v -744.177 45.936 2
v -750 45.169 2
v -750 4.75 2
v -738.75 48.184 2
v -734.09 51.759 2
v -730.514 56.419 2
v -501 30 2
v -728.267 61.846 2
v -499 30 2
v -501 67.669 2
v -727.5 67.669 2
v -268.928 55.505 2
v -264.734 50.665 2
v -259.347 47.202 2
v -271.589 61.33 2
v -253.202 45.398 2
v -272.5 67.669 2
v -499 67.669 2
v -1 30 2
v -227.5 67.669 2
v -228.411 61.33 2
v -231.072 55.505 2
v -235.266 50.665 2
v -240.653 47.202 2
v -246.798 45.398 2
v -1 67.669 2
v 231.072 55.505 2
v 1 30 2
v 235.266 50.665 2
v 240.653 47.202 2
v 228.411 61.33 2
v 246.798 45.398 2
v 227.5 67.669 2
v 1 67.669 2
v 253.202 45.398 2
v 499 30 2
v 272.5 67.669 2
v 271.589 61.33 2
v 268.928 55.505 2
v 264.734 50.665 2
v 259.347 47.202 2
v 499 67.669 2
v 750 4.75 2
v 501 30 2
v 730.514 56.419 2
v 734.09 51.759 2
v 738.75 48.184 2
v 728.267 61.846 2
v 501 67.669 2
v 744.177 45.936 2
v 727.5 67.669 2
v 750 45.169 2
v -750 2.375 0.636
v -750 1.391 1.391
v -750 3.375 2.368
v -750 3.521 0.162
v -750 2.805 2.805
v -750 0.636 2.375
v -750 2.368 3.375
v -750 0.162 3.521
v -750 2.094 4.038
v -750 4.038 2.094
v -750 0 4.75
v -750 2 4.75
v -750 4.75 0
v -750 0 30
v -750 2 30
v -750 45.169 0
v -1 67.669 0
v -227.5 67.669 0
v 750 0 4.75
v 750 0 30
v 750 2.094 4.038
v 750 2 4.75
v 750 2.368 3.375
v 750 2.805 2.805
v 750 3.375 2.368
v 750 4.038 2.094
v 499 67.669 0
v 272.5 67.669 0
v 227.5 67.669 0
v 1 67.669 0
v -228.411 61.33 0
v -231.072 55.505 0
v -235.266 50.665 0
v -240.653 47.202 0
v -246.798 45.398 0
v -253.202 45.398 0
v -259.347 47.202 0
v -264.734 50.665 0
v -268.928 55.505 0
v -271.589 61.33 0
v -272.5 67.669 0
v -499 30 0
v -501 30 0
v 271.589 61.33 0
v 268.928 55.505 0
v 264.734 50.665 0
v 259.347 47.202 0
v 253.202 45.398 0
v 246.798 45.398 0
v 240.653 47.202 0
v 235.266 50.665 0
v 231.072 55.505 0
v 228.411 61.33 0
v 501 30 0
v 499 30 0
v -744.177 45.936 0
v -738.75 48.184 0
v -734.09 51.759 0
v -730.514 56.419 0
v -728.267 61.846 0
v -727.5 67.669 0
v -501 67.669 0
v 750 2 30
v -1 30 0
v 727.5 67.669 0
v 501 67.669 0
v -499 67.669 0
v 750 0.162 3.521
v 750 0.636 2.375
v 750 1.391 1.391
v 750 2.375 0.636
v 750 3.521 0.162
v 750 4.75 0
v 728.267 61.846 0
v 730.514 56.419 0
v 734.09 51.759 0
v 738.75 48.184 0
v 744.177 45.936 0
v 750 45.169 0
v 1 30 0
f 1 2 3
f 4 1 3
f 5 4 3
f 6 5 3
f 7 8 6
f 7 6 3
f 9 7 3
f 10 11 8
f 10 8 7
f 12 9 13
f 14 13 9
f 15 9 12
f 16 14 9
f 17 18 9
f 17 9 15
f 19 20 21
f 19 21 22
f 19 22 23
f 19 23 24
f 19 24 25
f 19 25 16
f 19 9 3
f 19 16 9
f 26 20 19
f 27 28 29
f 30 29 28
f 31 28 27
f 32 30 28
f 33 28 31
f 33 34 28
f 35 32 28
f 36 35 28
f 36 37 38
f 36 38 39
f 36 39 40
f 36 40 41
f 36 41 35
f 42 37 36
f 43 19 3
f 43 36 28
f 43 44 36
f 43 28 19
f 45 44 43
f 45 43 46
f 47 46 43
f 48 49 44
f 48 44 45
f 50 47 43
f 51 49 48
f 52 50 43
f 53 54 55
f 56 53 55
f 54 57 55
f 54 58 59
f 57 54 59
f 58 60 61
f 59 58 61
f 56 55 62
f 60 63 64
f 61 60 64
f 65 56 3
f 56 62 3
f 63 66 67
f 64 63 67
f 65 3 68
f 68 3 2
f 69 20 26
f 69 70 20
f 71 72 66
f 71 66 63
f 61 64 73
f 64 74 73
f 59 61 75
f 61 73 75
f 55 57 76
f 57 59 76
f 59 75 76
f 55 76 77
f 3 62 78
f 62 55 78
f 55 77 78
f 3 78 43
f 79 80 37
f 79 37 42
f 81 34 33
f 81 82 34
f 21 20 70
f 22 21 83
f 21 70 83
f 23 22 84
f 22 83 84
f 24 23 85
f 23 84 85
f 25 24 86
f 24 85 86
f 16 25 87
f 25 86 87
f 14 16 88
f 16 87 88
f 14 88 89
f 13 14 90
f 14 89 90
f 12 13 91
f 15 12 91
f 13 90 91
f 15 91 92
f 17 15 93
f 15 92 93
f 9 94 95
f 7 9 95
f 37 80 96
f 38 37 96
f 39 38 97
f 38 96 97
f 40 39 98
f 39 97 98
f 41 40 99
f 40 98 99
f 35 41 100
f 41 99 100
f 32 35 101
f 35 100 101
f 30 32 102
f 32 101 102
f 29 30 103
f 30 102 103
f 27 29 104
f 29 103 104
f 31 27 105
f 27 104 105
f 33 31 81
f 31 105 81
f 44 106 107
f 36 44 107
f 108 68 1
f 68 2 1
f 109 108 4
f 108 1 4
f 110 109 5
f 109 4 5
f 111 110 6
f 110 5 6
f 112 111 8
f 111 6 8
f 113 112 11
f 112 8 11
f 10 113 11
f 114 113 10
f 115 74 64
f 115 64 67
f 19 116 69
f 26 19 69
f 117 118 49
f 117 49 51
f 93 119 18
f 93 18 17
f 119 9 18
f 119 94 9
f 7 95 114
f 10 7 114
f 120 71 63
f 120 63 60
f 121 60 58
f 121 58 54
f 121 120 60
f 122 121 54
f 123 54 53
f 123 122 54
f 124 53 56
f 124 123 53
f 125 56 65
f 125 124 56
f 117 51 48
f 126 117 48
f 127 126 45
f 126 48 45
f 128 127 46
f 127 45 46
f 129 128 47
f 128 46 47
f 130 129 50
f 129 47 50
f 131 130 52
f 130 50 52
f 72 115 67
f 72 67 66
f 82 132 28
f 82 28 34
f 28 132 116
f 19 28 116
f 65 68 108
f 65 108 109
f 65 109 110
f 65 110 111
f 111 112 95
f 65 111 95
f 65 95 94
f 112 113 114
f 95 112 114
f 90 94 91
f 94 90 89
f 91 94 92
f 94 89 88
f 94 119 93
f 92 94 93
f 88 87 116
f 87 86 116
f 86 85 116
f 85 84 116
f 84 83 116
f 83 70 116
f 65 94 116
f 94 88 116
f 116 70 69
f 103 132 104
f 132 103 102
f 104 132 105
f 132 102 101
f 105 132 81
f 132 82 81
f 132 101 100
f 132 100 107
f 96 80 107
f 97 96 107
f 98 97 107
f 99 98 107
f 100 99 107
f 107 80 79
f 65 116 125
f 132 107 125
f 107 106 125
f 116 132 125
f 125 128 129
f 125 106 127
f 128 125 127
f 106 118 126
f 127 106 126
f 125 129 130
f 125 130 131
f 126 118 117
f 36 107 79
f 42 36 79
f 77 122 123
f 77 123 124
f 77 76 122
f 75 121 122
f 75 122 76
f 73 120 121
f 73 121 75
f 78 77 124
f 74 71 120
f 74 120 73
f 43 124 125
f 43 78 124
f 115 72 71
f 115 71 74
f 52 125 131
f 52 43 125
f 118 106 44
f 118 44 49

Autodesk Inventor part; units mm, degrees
ref_plane "YZ Plane" through (0, 0, 0) normal (1, 0, 0) x (0, 1, 0)
ref_plane "XZ Plane" through (0, 0, 0) normal (0, 1, 0) x (-1, 0, 0)
ref_plane "XY Plane" through (0, 0, 0) normal (0, 0, 1) x (1, 0, 0)
sketch "Sketch1" plane through (0, 0, 0) normal (0, 0, 1) x (1, 0, 0)
  line L0 (-750, 67.6691) -> (750, 67.6691)
  line L1 (750, 67.6691) -> (750, 0)
  line L2 (750, 0) -> (-750, 0)
  line L3 (-750, 0) -> (-750, 67.6691)
  point P0 (0, 0)
  point P1 (0, 0)
  dimension "d0" = 1500
  dimension "d1" = 67.669
extrude "Plate1" add sketch "Sketch1" along normal blind 2
sketch "Sketch2" plane through (750, 2, 0) normal (0, -1, 0) x (1, 0, 0)
  line L0 (-1500, 0) -> (0, 0)
  line L1 (0, 0) -> (0, 30)
  line L2 (0, 30) -> (-1500, 30)
  line L3 (-1500, 30) -> (-1500, 0)
edge flange "Flange1" height 30 angle 90 thickness 2 bend radius 2.75 thickness toward (0, -1, 0) relief round relief width 2 relief depth 1 edges at (0, 0, 2) wall of the first edge with corners at (-750, 2, 0) (750, 2, 0) (750, 2, 30) (-750, 2, 30)
bend "Bend1"
corner "Corner1"
sketch "Sketch5" plane through (0, 0, 0) normal (0, 0, -1) x (-1, 0, 0)
  line L0 (750, 67.6691) -> (-750, 67.6691) projected
  line L1 (-1, 30) -> (-1, 67.6691)
  line L2 (750, 0) -> (-750, 0) projected
  line L3 (-1, 30) -> (1, 30)
  line L4 (1, 30) -> (1, 67.6691)
  point P0 (0, 0)
  point P1 (0, 30)
  point P2 (0, 0)
  dimension "d27" = 2
  dimension "d29" = 30
extrude "Extrusion1" cut sketch "Sketch5" against normal through all
pattern_linear "Rectangular Pattern1" count 3 spacing 500 along (1, 0, 0) of "Extrusion1" first direction both ways yes
sketch "Sketch6" plane through (0, 0, 0) normal (0, 0, -1) x (-1, 0, 0)
  line L0 (-750, 67.6691) -> (-750, 4.75) projected
  circle A0 centre (-750, 67.6691) radius 22.5
  line L1 (-750, 67.6691) -> (750, 67.6691) projected
  line L2 (-1, 67.6691) -> (-1, 30) projected
  line L3 (-499, 30) -> (-499, 67.6691) projected
  line L4 (-1, 30) -> (-499, 30) construction
  circle A1 centre (-250, 67.6691) radius 22.5
  point P0 (0, 0)
  point P1 (-727.5, 67.6691)
  point P2 (-750, 45.1691)
  point P3 (-250, 30)
  dimension "d24" = 45
extrude "Extrusion2" cut sketch "Sketch6" along normal mid plane 30 contours L1 A0 L0 | A1 L1 | L1 A1 picked at (-748.3311, 52.8571)
mirror "Mirror1" about plane through (0, 0, 0) normal (1, 0, 0) of "Extrusion2"
sketch "Sketch7" plane through (0, 0, 2) normal (0, 0, 1) x (1, 0, 0)
  arc A0 (-750, 45.1691) -> (-727.5, 67.6691) centre (-750, 67.6691) ccw projected
  line L0 (-750, 4.75) -> (-750, 45.1691) projected
  line L1 (-750, 4.75) -> (750, 4.75) projected
  line L2 (750, 45.1691) -> (750, 4.75) projected
  arc A1 (727.5, 67.6691) -> (750, 45.1691) centre (750, 67.6691) ccw projected
  line L3 (501, 67.6691) -> (727.5, 67.6691) projected
  line L4 (501, 67.6691) -> (501, 30) projected
  line L5 (501, 30) -> (499, 30) projected
  line L6 (499, 30) -> (499, 67.6691) projected
  line L7 (1, 67.6691) -> (227.5, 67.6691) projected
  line L8 (1, 67.6691) -> (1, 30) projected
  line L9 (1, 30) -> (-1, 30) projected
  line L10 (-1, 30) -> (-1, 67.6691) projected
  line L11 (-499, 67.6691) -> (-272.5, 67.6691) projected
  line L12 (-499, 67.6691) -> (-499, 30) projected
  line L13 (-499, 30) -> (-501, 30) projected
  line L14 (-501, 30) -> (-501, 67.6691) projected
  line L15 (-727.5, 67.6691) -> (-501, 67.6691) projected
  line L16 (649, 32.2095) -> (651, 32.2095)
  line L17 (651, 32.2095) -> (651, 40.2095)
  line L18 (651, 40.2095) -> (649, 40.2095)
  line L19 (649, 40.2095) -> (649, 32.2095)
  line L20 (-750, 4.75) -> (750, 4.75) projected
  line L21 (650, 4.75) -> (650, 67.6691) construction
  line L22 (637, 32.2095) -> (639, 32.2095)
  line L23 (639, 32.2095) -> (639, 40.2095)
  line L24 (639, 40.2095) -> (637, 40.2095)
  line L25 (637, 40.2095) -> (637, 32.2095)
  line L26 (272.5, 67.6691) -> (499, 67.6691) projected
  arc A2 (227.5, 67.6691) -> (272.5, 67.6691) centre (250, 67.6691) ccw projected
  line L27 (-227.5, 67.6691) -> (-1, 67.6691) projected
  arc A3 (-272.5, 67.6691) -> (-227.5, 67.6691) centre (-250, 67.6691) ccw projected
  point P0 (0, 0)
  point P1 (650, 32.2095)
  point P2 (649, 36.2095)
  point P3 (650, 36.2095)
  point P4 (639, 36.2095)
  dimension "d30" = 2
  dimension "d31" = 8
  dimension "d32" = 100
  dimension "d33" = 2
  dimension "d34" = 8
  dimension "d35" = 10
extrude "Extrusion3" [suppressed]
mirror "Mirror2" [suppressed]
sketch "Sketch9" plane through (0, 0, 2) normal (0, 0, 1) x (1, 0, 0)
  line L0 (494, 62.6691) -> (494, 50.6691) construction
  line L1 (494, 50.6691) -> (294, 50.6691) construction
  line L2 (294, 50.6691) -> (294, 62.6691) construction
  line L3 (294, 62.6691) -> (494, 62.6691) construction
  line L4 (499, 30) -> (499, 67.6691) projected
  line L5 (1, 67.6691) -> (499, 67.6691) projected
  point P0 (0, 0)
  dimension "d40" = 200
  dimension "d41" = 12
  dimension "d42" = 5
  dimension "d43" = 5
mark "Mark2"
equation "\"d1\" = Стрингер_2"
equation "\"d27\" = d18"
equation "\"d29\" = Стрингер_глубина_паза"
equation "\"d43\" = d42"
equation "\"d2\" = Thickness"
equation "\"d3\" = BendReliefWidth"
equation "\"d4\" = BendReliefDepth"
equation "\"d5\" = MinimumRemnant"
equation "\"d6\" = TransitionRadius"
equation "\"d9\" = BendRadius"
equation "\"d10\" = CornerReliefSize"
equation "\"d11\" = GapSize"
equation "\"d12\" = JacobiRadiusSize"
equation "\"BendReliefWidth\" = Thickness"
equation "\"BendReliefDepth\" = 0.5 * Thickness"
equation "\"CornerReliefSize\" = 4 * Thickness"
equation "\"MinimumRemnant\" = 2 * Thickness"
equation "\"TransitionRadius\" = BendRadius"
equation "\"JacobiRadiusSize\" = BendRadius"
equation "\"GapSize\" = Thickness"
equation "\"d18\" = Thickness"
equation "\"qqqqqq\" = 67.35706"
equation "\"Стрингер_2\" = 67.669053"
equation "\"Стрингер_глубина_паза\" = 30"
equation "\"Thickness\" = 2"
equation "\"BendRadius\" = 2.75"
properties part number "МОО 062 stringer спина ^^" material "Stainless Steel"
